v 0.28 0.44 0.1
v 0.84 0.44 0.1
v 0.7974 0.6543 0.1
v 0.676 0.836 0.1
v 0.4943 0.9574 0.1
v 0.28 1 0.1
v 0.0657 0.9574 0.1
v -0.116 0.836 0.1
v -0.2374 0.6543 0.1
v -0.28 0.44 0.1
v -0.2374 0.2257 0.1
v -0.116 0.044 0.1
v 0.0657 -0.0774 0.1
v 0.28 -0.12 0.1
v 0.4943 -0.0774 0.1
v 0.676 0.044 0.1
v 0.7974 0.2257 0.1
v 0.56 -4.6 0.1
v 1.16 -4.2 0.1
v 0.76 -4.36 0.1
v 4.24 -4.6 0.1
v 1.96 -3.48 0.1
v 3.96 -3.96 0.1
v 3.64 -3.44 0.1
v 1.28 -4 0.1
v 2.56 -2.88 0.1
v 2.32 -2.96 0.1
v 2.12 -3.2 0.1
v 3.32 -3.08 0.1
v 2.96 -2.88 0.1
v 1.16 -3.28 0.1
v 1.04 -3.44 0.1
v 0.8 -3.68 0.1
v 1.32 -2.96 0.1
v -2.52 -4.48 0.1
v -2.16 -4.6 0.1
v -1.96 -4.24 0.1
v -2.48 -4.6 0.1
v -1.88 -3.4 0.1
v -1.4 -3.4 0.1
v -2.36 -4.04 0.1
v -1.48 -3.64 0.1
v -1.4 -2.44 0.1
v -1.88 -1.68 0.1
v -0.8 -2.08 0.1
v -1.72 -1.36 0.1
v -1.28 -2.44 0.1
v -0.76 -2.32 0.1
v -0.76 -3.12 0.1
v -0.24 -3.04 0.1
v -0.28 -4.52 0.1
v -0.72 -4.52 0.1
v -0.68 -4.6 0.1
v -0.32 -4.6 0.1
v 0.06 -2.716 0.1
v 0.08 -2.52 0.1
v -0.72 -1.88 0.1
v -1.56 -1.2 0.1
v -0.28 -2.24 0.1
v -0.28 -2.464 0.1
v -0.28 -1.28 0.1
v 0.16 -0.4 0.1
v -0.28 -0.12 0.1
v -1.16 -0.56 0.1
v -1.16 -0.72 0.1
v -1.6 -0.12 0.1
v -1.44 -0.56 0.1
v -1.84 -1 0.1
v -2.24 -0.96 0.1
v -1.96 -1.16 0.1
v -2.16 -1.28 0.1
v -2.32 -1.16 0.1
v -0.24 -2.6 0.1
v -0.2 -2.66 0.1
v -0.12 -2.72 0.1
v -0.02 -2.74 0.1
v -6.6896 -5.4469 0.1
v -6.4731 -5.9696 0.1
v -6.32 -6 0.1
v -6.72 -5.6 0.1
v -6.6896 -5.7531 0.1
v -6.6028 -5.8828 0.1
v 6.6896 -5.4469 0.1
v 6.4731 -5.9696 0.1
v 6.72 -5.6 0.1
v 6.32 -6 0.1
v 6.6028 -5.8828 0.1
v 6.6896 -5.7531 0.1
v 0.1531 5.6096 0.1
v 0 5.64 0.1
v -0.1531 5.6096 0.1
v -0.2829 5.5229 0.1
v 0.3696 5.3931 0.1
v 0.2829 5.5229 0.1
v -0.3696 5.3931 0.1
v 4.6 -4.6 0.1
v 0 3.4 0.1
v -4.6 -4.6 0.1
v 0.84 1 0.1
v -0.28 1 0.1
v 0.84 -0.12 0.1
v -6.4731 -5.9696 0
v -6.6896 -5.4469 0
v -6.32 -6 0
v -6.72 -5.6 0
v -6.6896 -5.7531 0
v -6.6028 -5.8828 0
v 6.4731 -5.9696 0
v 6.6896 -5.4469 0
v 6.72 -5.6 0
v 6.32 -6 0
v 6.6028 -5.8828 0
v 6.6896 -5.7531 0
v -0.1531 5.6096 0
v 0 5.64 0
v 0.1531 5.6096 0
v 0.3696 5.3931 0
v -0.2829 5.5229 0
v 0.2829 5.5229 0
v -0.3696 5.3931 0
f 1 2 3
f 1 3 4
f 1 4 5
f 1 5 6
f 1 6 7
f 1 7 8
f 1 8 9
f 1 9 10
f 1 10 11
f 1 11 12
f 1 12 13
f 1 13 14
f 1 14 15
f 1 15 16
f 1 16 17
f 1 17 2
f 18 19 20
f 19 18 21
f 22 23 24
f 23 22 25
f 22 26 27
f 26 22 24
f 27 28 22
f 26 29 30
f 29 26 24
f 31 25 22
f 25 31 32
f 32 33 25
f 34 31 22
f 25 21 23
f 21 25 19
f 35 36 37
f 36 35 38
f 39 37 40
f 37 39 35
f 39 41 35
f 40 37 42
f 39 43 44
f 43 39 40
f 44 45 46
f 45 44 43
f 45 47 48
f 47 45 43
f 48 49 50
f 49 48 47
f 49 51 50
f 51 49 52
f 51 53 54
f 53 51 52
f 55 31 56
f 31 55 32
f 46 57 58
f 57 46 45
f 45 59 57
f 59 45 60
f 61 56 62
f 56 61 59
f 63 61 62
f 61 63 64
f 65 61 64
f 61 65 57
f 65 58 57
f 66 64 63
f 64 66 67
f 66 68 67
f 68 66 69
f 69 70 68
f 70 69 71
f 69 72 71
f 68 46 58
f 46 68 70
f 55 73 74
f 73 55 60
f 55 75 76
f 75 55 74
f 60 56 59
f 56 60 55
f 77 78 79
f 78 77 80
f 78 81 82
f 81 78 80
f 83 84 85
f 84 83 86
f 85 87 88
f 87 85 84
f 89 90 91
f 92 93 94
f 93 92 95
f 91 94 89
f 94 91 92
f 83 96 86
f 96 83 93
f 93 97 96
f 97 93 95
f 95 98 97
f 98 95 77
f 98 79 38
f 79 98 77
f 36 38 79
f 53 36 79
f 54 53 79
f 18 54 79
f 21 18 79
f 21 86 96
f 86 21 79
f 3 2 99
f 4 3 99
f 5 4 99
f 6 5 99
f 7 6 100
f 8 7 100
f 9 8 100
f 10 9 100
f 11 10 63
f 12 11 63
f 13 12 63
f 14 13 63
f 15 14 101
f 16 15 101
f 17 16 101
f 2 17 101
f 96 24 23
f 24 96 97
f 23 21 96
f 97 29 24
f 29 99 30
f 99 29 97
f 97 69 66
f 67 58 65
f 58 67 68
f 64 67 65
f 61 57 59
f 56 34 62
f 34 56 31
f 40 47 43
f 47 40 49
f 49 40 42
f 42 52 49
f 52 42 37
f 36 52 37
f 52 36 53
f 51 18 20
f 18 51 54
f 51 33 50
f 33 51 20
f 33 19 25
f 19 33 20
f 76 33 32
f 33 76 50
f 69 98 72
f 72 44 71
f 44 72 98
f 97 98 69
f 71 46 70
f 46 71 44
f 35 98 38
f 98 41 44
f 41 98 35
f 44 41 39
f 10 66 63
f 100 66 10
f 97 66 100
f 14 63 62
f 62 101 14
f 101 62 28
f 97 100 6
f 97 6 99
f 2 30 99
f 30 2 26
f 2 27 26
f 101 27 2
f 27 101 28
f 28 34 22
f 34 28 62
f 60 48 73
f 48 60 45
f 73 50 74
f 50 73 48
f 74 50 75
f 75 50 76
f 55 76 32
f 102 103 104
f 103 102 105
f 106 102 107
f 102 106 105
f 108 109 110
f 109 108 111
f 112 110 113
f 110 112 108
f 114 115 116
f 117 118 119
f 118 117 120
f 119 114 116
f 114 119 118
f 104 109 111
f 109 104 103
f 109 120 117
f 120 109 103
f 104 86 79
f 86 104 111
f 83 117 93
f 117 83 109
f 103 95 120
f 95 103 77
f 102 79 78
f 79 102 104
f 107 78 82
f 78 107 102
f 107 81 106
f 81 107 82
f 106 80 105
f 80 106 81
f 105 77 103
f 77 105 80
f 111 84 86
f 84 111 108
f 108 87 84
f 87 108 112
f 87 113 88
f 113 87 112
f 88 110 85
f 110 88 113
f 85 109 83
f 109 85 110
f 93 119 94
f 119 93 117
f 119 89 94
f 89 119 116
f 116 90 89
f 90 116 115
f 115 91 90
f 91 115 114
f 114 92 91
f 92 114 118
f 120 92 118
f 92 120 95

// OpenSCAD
// file: ../p/5-16cyli.scad
use <../lib.scad>
function ldraw_lib__5_16cyli() = [
// 0 Cylinder 0.3125
// 0 Name: 5-16cyli.dat
// 0 Author: Philippe Hurbain [Philo]
// 0 !LDRAW_ORG Primitive UPDATE 2009-03
// 0 !LICENSE Licensed under CC BY 4.0 : see CAreadme.txt
// 
// 0 BFC CERTIFY CCW
  [0,"BFC","CERTIFY"],
  [0,"BFC","CCW"],
// 
// 0 !HISTORY 2009-12-29 [PTadmin] Official Update 2009-03
// 
// 
// 4 16 0.9239 0 0.3827 1 0 0 1 1 0 0.9239 1 0.3827
  [4,16,0.9239,0,0.3827,1,0,0,1,1,0,0.9239,1,0.3827],
// 4 16 0.7071 0 0.7071 0.9239 0 0.3827 0.9239 1 0.3827 0.7071 1 0.7071
  [4,16,0.7071,0,0.7071,0.9239,0,0.3827,0.9239,1,0.3827,0.7071,1,0.7071],
// 4 16 0.3827 0 0.9239 0.7071 0 0.7071 0.7071 1 0.7071 0.3827 1 0.9239
  [4,16,0.3827,0,0.9239,0.7071,0,0.7071,0.7071,1,0.7071,0.3827,1,0.9239],
// 4 16 0 0 1 0.3827 0 0.9239 0.3827 1 0.9239 0 1 1
  [4,16,0,0,1,0.3827,0,0.9239,0.3827,1,0.9239,0,1,1],
// 4 16 -0.3827 0 0.9239 0 0 1 0 1 1 -0.3827 1 0.9239
  [4,16,-0.3827,0,0.9239,0,0,1,0,1,1,-0.3827,1,0.9239],
// 
// 0 // conditional lines
// 5 24 1 1 0 1 0 0 1 1 -0.4142 0.9239 1 0.3827
  [5,24,1,1,0,1,0,0,1,1,-0.4142,0.9239,1,0.3827],
// 5 24 0.9239 1 0.3827 0.9239 0 0.3827 1 1 0 0.7071 1 0.7071
  [5,24,0.9239,1,0.3827,0.9239,0,0.3827,1,1,0,0.7071,1,0.7071],
// 5 24 0.7071 1 0.7071 0.7071 0 0.7071 0.9239 1 0.3827 0.3827 1 0.9239
  [5,24,0.7071,1,0.7071,0.7071,0,0.7071,0.9239,1,0.3827,0.3827,1,0.9239],
// 5 24 0.3827 1 0.9239 0.3827 0 0.9239 0.7071 1 0.7071 0 1 1
  [5,24,0.3827,1,0.9239,0.3827,0,0.9239,0.7071,1,0.7071,0,1,1],
// 5 24 0 1 1 0 0 1 0.3827 1 0.9239 -0.3827 1 0.9239
  [5,24,0,1,1,0,0,1,0.3827,1,0.9239,-0.3827,1,0.9239],
// 5 24 -0.3827 1 0.9239 -0.3827 0 0.9239 0 1 1 -0.7654 1 0.7654
  [5,24,-0.3827,1,0.9239,-0.3827,0,0.9239,0,1,1,-0.7654,1,0.7654],
// 
// 0 // end of file
// 
];
module ldraw_lib__5_16cyli(step=0, col=false, unit=2/5, alt=false, line=0.2, solid=!$preview)
    makepoly(ldraw_lib__5_16cyli(), step=step, col=col, unit=unit, alt=alt, line=line, solid=solid);
ldraw_lib__5_16cyli(line=0.2);
// file: ../p/5-16chrd.scad
use <../lib.scad>
function ldraw_lib__5_16chrd() = [
// 0 Chord 0.3125
// 0 Name: 5-16chrd.dat
// 0 Author: Niels Karsdorp [nielsk]
// 0 !LDRAW_ORG Primitive UPDATE 2010-01
// 0 !LICENSE Licensed under CC BY 4.0 : see CAreadme.txt
// 
// 0 BFC CERTIFY CCW
  [0,"BFC","CERTIFY"],
  [0,"BFC","CCW"],
// 
// 0 !HISTORY 2010-04-05 [PTadmin] Official Update 2010-01
// 
// 
// 4 16 1 0 0 0.9239 0 0.3827 0 0 1 -0.3827 0 0.9239
  [4,16,1,0,0,0.9239,0,0.3827,0,0,1,-0.3827,0,0.9239],
// 4 16 0.9239 0 0.3827 0.7071 0 0.7071 0.3827 0 0.9239 0 0 1
  [4,16,0.9239,0,0.3827,0.7071,0,0.7071,0.3827,0,0.9239,0,0,1],
// 0
// 
];
module ldraw_lib__5_16chrd(step=0, col=false, unit=2/5, alt=false, line=0.2, solid=!$preview)
    makepoly(ldraw_lib__5_16chrd(), step=step, col=col, unit=unit, alt=alt, line=line, solid=solid);
ldraw_lib__5_16chrd(line=0.2);
// file: ../p/4-4ndis.scad
use <../lib.scad>
function ldraw_lib__4_4ndis() = [
// 0 Disc Negative 1.0
// 0 Name: 4-4ndis.dat
// 0 Author: James Jessiman
// 0 !LDRAW_ORG Primitive UPDATE 2012-01
// 0 !LICENSE Licensed under CC BY 4.0 : see CAreadme.txt
// 
// 0 BFC CERTIFY CCW
  [0,"BFC","CERTIFY"],
  [0,"BFC","CCW"],
// 
// 0 !HISTORY 2002-03-23 [sbliss] Added BFC statement; compacted code
// 0 !HISTORY 2002-04-25 [PTadmin] Official Update 2002-02
// 0 !HISTORY 2007-06-24 [PTadmin] Header formatted for Contributor Agreement
// 0 !HISTORY 2008-07-01 [PTadmin] Official Update 2008-01
// 0 !HISTORY 2012-02-16 [Philo] Changed to CCW
// 0 !HISTORY 2012-03-30 [PTadmin] Official Update 2012-01
// 
// 
// 3 16 0.9239 0 0.3827 1 0 0 1 0 1
  [3,16,0.9239,0,0.3827,1,0,0,1,0,1],
// 3 16 0.7071 0 0.7071 0.9239 0 0.3827 1 0 1
  [3,16,0.7071,0,0.7071,0.9239,0,0.3827,1,0,1],
// 3 16 0.3827 0 0.9239 0.7071 0 0.7071 1 0 1
  [3,16,0.3827,0,0.9239,0.7071,0,0.7071,1,0,1],
// 3 16 0 0 1 0.3827 0 0.9239 1 0 1
  [3,16,0,0,1,0.3827,0,0.9239,1,0,1],
// 3 16 -0.3827 0 0.9239 0 0 1 -1 0 1
  [3,16,-0.3827,0,0.9239,0,0,1,-1,0,1],
// 3 16 -0.7071 0 0.7071 -0.3827 0 0.9239 -1 0 1
  [3,16,-0.7071,0,0.7071,-0.3827,0,0.9239,-1,0,1],
// 3 16 -0.9239 0 0.3827 -0.7071 0 0.7071 -1 0 1
  [3,16,-0.9239,0,0.3827,-0.7071,0,0.7071,-1,0,1],
// 3 16 -1 0 0 -0.9239 0 0.3827 -1 0 1
  [3,16,-1,0,0,-0.9239,0,0.3827,-1,0,1],
// 3 16 -0.9239 0 -0.3827 -1 0 0 -1 0 -1
  [3,16,-0.9239,0,-0.3827,-1,0,0,-1,0,-1],
// 3 16 -0.7071 0 -0.7071 -0.9239 0 -0.3827 -1 0 -1
  [3,16,-0.7071,0,-0.7071,-0.9239,0,-0.3827,-1,0,-1],
// 3 16 -0.3827 0 -0.9239 -0.7071 0 -0.7071 -1 0 -1
  [3,16,-0.3827,0,-0.9239,-0.7071,0,-0.7071,-1,0,-1],
// 3 16 0 0 -1 -0.3827 0 -0.9239 -1 0 -1
  [3,16,0,0,-1,-0.3827,0,-0.9239,-1,0,-1],
// 3 16 0.3827 0 -0.9239 0 0 -1 1 0 -1
  [3,16,0.3827,0,-0.9239,0,0,-1,1,0,-1],
// 3 16 0.7071 0 -0.7071 0.3827 0 -0.9239 1 0 -1
  [3,16,0.7071,0,-0.7071,0.3827,0,-0.9239,1,0,-1],
// 3 16 0.9239 0 -0.3827 0.7071 0 -0.7071 1 0 -1
  [3,16,0.9239,0,-0.3827,0.7071,0,-0.7071,1,0,-1],
// 3 16 1 0 0 0.9239 0 -0.3827 1 0 -1
  [3,16,1,0,0,0.9239,0,-0.3827,1,0,-1],
];
module ldraw_lib__4_4ndis(step=0, col=false, unit=2/5, alt=false, line=0.2, solid=!$preview)
    makepoly(ldraw_lib__4_4ndis(), step=step, col=col, unit=unit, alt=alt, line=line, solid=solid);
ldraw_lib__4_4ndis(line=0.2);
// file: ../p/4-4disc.scad
use <../lib.scad>
function ldraw_lib__4_4disc() = [
// 0 Disc 1.0
// 0 Name: 4-4disc.dat
// 0 Author: James Jessiman
// 0 !LDRAW_ORG Primitive UPDATE 2002-02
// 0 !LICENSE Licensed under CC BY 4.0 : see CAreadme.txt
// 
// 0 BFC CERTIFY CCW
  [0,"BFC","CERTIFY"],
  [0,"BFC","CCW"],
// 
// 0 !HISTORY 1998-12-15 [PTadmin] Official Update 1998-10
// 0 !HISTORY 2002-03-23 [sbliss] Added BFC statement
// 0 !HISTORY 2002-04-25 [PTadmin] Official Update 2002-02
// 0 !HISTORY 2007-06-24 [PTadmin] Header formatted for Contributor Agreement
// 0 !HISTORY 2008-07-01 [PTadmin] Official Update 2008-01
// 
// 
// 3 16 0 0 0 1 0 0 0.9239 0 0.3827
  [3,16,0,0,0,1,0,0,0.9239,0,0.3827],
// 3 16 0 0 0 0.9239 0 0.3827 0.7071 0 0.7071
  [3,16,0,0,0,0.9239,0,0.3827,0.7071,0,0.7071],
// 3 16 0 0 0 0.7071 0 0.7071 0.3827 0 0.9239
  [3,16,0,0,0,0.7071,0,0.7071,0.3827,0,0.9239],
// 3 16 0 0 0 0.3827 0 0.9239 0 0 1
  [3,16,0,0,0,0.3827,0,0.9239,0,0,1],
// 3 16 0 0 0 0 0 1 -0.3827 0 0.9239
  [3,16,0,0,0,0,0,1,-0.3827,0,0.9239],
// 3 16 0 0 0 -0.3827 0 0.9239 -0.7071 0 0.7071
  [3,16,0,0,0,-0.3827,0,0.9239,-0.7071,0,0.7071],
// 3 16 0 0 0 -0.7071 0 0.7071 -0.9239 0 0.3827
  [3,16,0,0,0,-0.7071,0,0.7071,-0.9239,0,0.3827],
// 3 16 0 0 0 -0.9239 0 0.3827 -1 0 -0
  [3,16,0,0,0,-0.9239,0,0.3827,-1,0,-0],
// 3 16 0 0 0 -1 0 -0 -0.9239 0 -0.3827
  [3,16,0,0,0,-1,0,-0,-0.9239,0,-0.3827],
// 3 16 0 0 0 -0.9239 0 -0.3827 -0.7071 0 -0.7071
  [3,16,0,0,0,-0.9239,0,-0.3827,-0.7071,0,-0.7071],
// 3 16 0 0 0 -0.7071 0 -0.7071 -0.3827 0 -0.9239
  [3,16,0,0,0,-0.7071,0,-0.7071,-0.3827,0,-0.9239],
// 3 16 0 0 0 -0.3827 0 -0.9239 0 0 -1
  [3,16,0,0,0,-0.3827,0,-0.9239,0,0,-1],
// 3 16 0 0 0 0 0 -1 0.3827 0 -0.9239
  [3,16,0,0,0,0,0,-1,0.3827,0,-0.9239],
// 3 16 0 0 0 0.3827 0 -0.9239 0.7071 0 -0.7071
  [3,16,0,0,0,0.3827,0,-0.9239,0.7071,0,-0.7071],
// 3 16 0 0 0 0.7071 0 -0.7071 0.9239 0 -0.3827
  [3,16,0,0,0,0.7071,0,-0.7071,0.9239,0,-0.3827],
// 3 16 0 0 0 0.9239 0 -0.3827 1 0 0
  [3,16,0,0,0,0.9239,0,-0.3827,1,0,0],
// 0
];
module ldraw_lib__4_4disc(step=0, col=false, unit=2/5, alt=false, line=0.2, solid=!$preview)
    makepoly(ldraw_lib__4_4disc(), step=step, col=col, unit=unit, alt=alt, line=line, solid=solid);
ldraw_lib__4_4disc(line=0.2);
// file: ../p/3-8cyli.scad
use <../lib.scad>
function ldraw_lib__3_8cyli() = [
// 0 Cylinder 0.375
// 0 Name: 3-8cyli.dat
// 0 Author: James Jessiman
// 0 !LDRAW_ORG Primitive UPDATE 2005-01
// 0 !LICENSE Licensed under CC BY 4.0 : see CAreadme.txt
// 
// 0 BFC CERTIFY CCW
  [0,"BFC","CERTIFY"],
  [0,"BFC","CCW"],
// 
// 0 !HISTORY 2002-05-08 [OrionP] Made BFC compliant
// 0 !HISTORY 2002-08-18 [PTadmin] Official Update 2002-04
// 0 !HISTORY 2004-12-11 [nielsk] Recreated using Primitive Generator, Edge lines fixed, BFC changed to CCW
// 0 !HISTORY 2005-12-28 [PTadmin] Official Update 2005-01
// 0 !HISTORY 2007-06-24 [PTadmin] Header formatted for Contributor Agreement
// 0 !HISTORY 2008-07-01 [PTadmin] Official Update 2008-01
// 
// 
// 4 16 .9239 1 .3827 .9239 0 .3827 1 0 0 1 1 0
  [4,16,.9239,1,.3827,.9239,0,.3827,1,0,0,1,1,0],
// 4 16 .7071 1 .7071 .7071 0 .7071 .9239 0 .3827 .9239 1 .3827
  [4,16,.7071,1,.7071,.7071,0,.7071,.9239,0,.3827,.9239,1,.3827],
// 4 16 .3827 1 .9239 .3827 0 .9239 .7071 0 .7071 .7071 1 .7071
  [4,16,.3827,1,.9239,.3827,0,.9239,.7071,0,.7071,.7071,1,.7071],
// 4 16 0 1 1 0 0 1 .3827 0 .9239 .3827 1 .9239
  [4,16,0,1,1,0,0,1,.3827,0,.9239,.3827,1,.9239],
// 4 16 -.3827 1 .9239 -.3827 0 .9239 0 0 1 0 1 1
  [4,16,-.3827,1,.9239,-.3827,0,.9239,0,0,1,0,1,1],
// 4 16 -.7071 1 .7071 -.7071 0 .7071 -.3827 0 .9239 -.3827 1 .9239
  [4,16,-.7071,1,.7071,-.7071,0,.7071,-.3827,0,.9239,-.3827,1,.9239],
// 5 24 1 1 0 1 0 0 1 1 -.4142 .9239 1 .3827
  [5,24,1,1,0,1,0,0,1,1,-.4142,.9239,1,.3827],
// 5 24 .9239 1 .3827 .9239 0 .3827 1 1 0 .7071 1 .7071
  [5,24,.9239,1,.3827,.9239,0,.3827,1,1,0,.7071,1,.7071],
// 5 24 .7071 1 .7071 .7071 0 .7071 .9239 1 .3827 .3827 1 .9239
  [5,24,.7071,1,.7071,.7071,0,.7071,.9239,1,.3827,.3827,1,.9239],
// 5 24 .3827 1 .9239 .3827 0 .9239 .7071 1 .7071 0 1 1
  [5,24,.3827,1,.9239,.3827,0,.9239,.7071,1,.7071,0,1,1],
// 5 24 0 1 1 0 0 1 .3827 1 .9239 -.3827 1 .9239
  [5,24,0,1,1,0,0,1,.3827,1,.9239,-.3827,1,.9239],
// 5 24 -.3827 1 .9239 -.3827 0 .9239 0 1 1 -.7071 1 .7071
  [5,24,-.3827,1,.9239,-.3827,0,.9239,0,1,1,-.7071,1,.7071],
// 5 24 -.7071 1 .7071 -.7071 0 .7071 -.3827 1 .9239 -1 1 .4142
  [5,24,-.7071,1,.7071,-.7071,0,.7071,-.3827,1,.9239,-1,1,.4142],
// 0
];
module ldraw_lib__3_8cyli(step=0, col=false, unit=2/5, alt=false, line=0.2, solid=!$preview)
    makepoly(ldraw_lib__3_8cyli(), step=step, col=col, unit=unit, alt=alt, line=line, solid=solid);
ldraw_lib__3_8cyli(line=0.2);
// file: ../p/3-8chrd.scad
use <../lib.scad>
function ldraw_lib__3_8chrd() = [
// 0 Chord 0.375
// 0 Name: 3-8chrd.dat
// 0 Author: Donald Sutter [technog]
// 0 !LDRAW_ORG Primitive UPDATE 2005-01
// 0 !LICENSE Licensed under CC BY 4.0 : see CAreadme.txt
// 
// 0 BFC CERTIFY CCW
  [0,"BFC","CERTIFY"],
  [0,"BFC","CCW"],
// 
// 0 !HISTORY 2004-01-07 [Steffen] added primitive code for POVray
// 0 !HISTORY 2004-03-18 [mkennedy] removed pov code and rearanged polygons.
// 0 !HISTORY 2004-09-12 [cwdee] reversed winding and standardised precision
// 0 !HISTORY 2005-12-28 [PTadmin] Official Update 2005-01
// 0 !HISTORY 2007-06-24 [PTadmin] Header formatted for Contributor Agreement
// 0 !HISTORY 2008-07-01 [PTadmin] Official Update 2008-01
// 
// 
// 3 16 0.7071 0 0.7071 0.3827 0 0.9239 0 0 1
  [3,16,0.7071,0,0.7071,0.3827,0,0.9239,0,0,1],
// 4 16 0.9239 0 0.3827 -0.3827 0 0.9239 -0.7071 0 0.7071 1 0 0
  [4,16,0.9239,0,0.3827,-0.3827,0,0.9239,-0.7071,0,0.7071,1,0,0],
// 4 16 0.7071 0 0.7071 0 0 1 -0.3827 0 0.9239 0.9239 0 0.3827
  [4,16,0.7071,0,0.7071,0,0,1,-0.3827,0,0.9239,0.9239,0,0.3827],
// 0
];
module ldraw_lib__3_8chrd(step=0, col=false, unit=2/5, alt=false, line=0.2, solid=!$preview)
    makepoly(ldraw_lib__3_8chrd(), step=step, col=col, unit=unit, alt=alt, line=line, solid=solid);
ldraw_lib__3_8chrd(line=0.2);
// main file
use <../lib.scad>
use <../p/3-8chrd.scad>
use <../p/3-8cyli.scad>
use <../p/4-4disc.scad>
use <../p/4-4ndis.scad>
use <../p/5-16chrd.scad>
use <../p/5-16cyli.scad>
function ldraw_lib__4297022f() = [
// 0 Sticker  1.5 x  1.7 Triangular with Worker and  1 Pile
// 0 Name: 4297022f.dat
// 0 Author: Evert-Jan Boer [ejboer]
// 0 !LDRAW_ORG Part UPDATE 2026-02
// 0 !LICENSE Licensed under CC BY 4.0 : see CAreadme.txt
// 
// 0 BFC CERTIFY CCW
  [0,"BFC","CERTIFY"],
  [0,"BFC","CCW"],
// 
// 0 !KEYWORDS Bricklink 7905stk01, Brickowl 660798, Rebrickable 56716, Road Works
// 0 !KEYWORDS Set 7905, Tower Crane
// 
// 0 !HISTORY 2024-06-30 [OrionP] Official Update 2024-05
// 0 !HISTORY 2026-03-03 [MagFors] Update description, reduced decimals
// 0 !HISTORY 2026-03-06 [OrionP] Official Update 2026-02
// 
// 1 0 .7 -.25 1.1 1.4 0 0 0 1 0 0 0 1.4 4-4disc.dat
  [1,0,.7,-.25,1.1,1.4,0,0,0,1,0,0,0,1.4, ldraw_lib__4_4disc()],
// 4 0 1.9 -.25 -10.9 1.4 -.25 -11.5 10.6 -.25 -11.5 2.9 -.25 -10.5
  [4,0,1.9,-.25,-10.9,1.4,-.25,-11.5,10.6,-.25,-11.5,2.9,-.25,-10.5],
// 4 0 4.9 -.25 -8.7 3.2 -.25 -10 9.9 -.25 -9.9 9.1 -.25 -8.6
  [4,0,4.9,-.25,-8.7,3.2,-.25,-10,9.9,-.25,-9.9,9.1,-.25,-8.6],
// 4 0 6.4 -.25 -7.2 5.8 -.25 -7.4 4.9 -.25 -8.7 9.1 -.25 -8.6
  [4,0,6.4,-.25,-7.2,5.8,-.25,-7.4,4.9,-.25,-8.7,9.1,-.25,-8.6],
// 3 0 5.8 -.25 -7.4 5.3 -.25 -8 4.9 -.25 -8.7
  [3,0,5.8,-.25,-7.4,5.3,-.25,-8,4.9,-.25,-8.7],
// 4 0 7.4 -.25 -7.2 6.4 -.25 -7.2 9.1 -.25 -8.6 8.3 -.25 -7.7
  [4,0,7.4,-.25,-7.2,6.4,-.25,-7.2,9.1,-.25,-8.6,8.3,-.25,-7.7],
// 4 0 4.9 -.25 -8.7 2.9 -.25 -8.2 2.6 -.25 -8.6 3.2 -.25 -10
  [4,0,4.9,-.25,-8.7,2.9,-.25,-8.2,2.6,-.25,-8.6,3.2,-.25,-10],
// 3 0 2.6 -.25 -8.6 2 -.25 -9.2 3.2 -.25 -10
  [3,0,2.6,-.25,-8.6,2,-.25,-9.2,3.2,-.25,-10],
// 3 0 3.3 -.25 -7.4 2.9 -.25 -8.2 4.9 -.25 -8.7
  [3,0,3.3,-.25,-7.4,2.9,-.25,-8.2,4.9,-.25,-8.7],
// 4 0 2.9 -.25 -10.5 10.6 -.25 -11.5 9.9 -.25 -9.9 3.2 -.25 -10
  [4,0,2.9,-.25,-10.5,10.6,-.25,-11.5,9.9,-.25,-9.9,3.2,-.25,-10],
// 4 0 -6.3 -.25 -11.2 -6.2 -.25 -11.5 -5.4 -.25 -11.5 -4.9 -.25 -10.6
  [4,0,-6.3,-.25,-11.2,-6.2,-.25,-11.5,-5.4,-.25,-11.5,-4.9,-.25,-10.6],
// 4 0 -3.5 -.25 -8.5 -4.7 -.25 -8.5 -6.3 -.25 -11.2 -4.9 -.25 -10.6
  [4,0,-3.5,-.25,-8.5,-4.7,-.25,-8.5,-6.3,-.25,-11.2,-4.9,-.25,-10.6],
// 3 0 -4.7 -.25 -8.5 -5.9 -.25 -10.1 -6.3 -.25 -11.2
  [3,0,-4.7,-.25,-8.5,-5.9,-.25,-10.1,-6.3,-.25,-11.2],
// 3 0 -3.5 -.25 -8.5 -4.9 -.25 -10.6 -3.7 -.25 -9.1
  [3,0,-3.5,-.25,-8.5,-4.9,-.25,-10.6,-3.7,-.25,-9.1],
// 4 0 -4.7 -.25 -8.5 -3.5 -.25 -8.5 -3.5 -.25 -6.1 -4.7 -.25 -4.2
  [4,0,-4.7,-.25,-8.5,-3.5,-.25,-8.5,-3.5,-.25,-6.1,-4.7,-.25,-4.2],
// 4 0 -3.5 -.25 -6.1 -2 -.25 -5.2 -4.3 -.25 -3.4 -4.7 -.25 -4.2
  [4,0,-3.5,-.25,-6.1,-2,-.25,-5.2,-4.3,-.25,-3.4,-4.7,-.25,-4.2],
// 4 0 -2 -.25 -5.2 -3.5 -.25 -6.1 -3.2 -.25 -6.1 -1.9 -.25 -5.8
  [4,0,-2,-.25,-5.2,-3.5,-.25,-6.1,-3.2,-.25,-6.1,-1.9,-.25,-5.8],
// 4 0 -1.9 -.25 -7.8 -.6 -.25 -7.6 -1.9 -.25 -5.8 -3.2 -.25 -6.1
  [4,0,-1.9,-.25,-7.8,-.6,-.25,-7.6,-1.9,-.25,-5.8,-3.2,-.25,-6.1],
// 4 0 -1.8 -.25 -11.3 -.7 -.25 -11.3 -.6 -.25 -7.6 -1.9 -.25 -7.8
  [4,0,-1.8,-.25,-11.3,-.7,-.25,-11.3,-.6,-.25,-7.6,-1.9,-.25,-7.8],
// 4 0 -1.7 -.25 -11.5 -.8 -.25 -11.5 -.7 -.25 -11.3 -1.8 -.25 -11.3
  [4,0,-1.7,-.25,-11.5,-.8,-.25,-11.5,-.7,-.25,-11.3,-1.8,-.25,-11.3],
// 4 0 2.6 -.25 -8.6 2.9 -.25 -8.2 .2 -.25 -6.3 .15 -.25 -6.79
  [4,0,2.6,-.25,-8.6,2.9,-.25,-8.2,.2,-.25,-6.3,.15,-.25,-6.79],
// 4 0 -1.8 -.25 -4.7 -3.9 -.25 -3 -4.3 -.25 -3.4 -2 -.25 -5.2
  [4,0,-1.8,-.25,-4.7,-3.9,-.25,-3,-4.3,-.25,-3.4,-2,-.25,-5.2],
// 4 0 -.7 -.25 -5.6 -1.8 -.25 -4.7 -2 -.25 -5.2 -.7 -.25 -6.16
  [4,0,-.7,-.25,-5.6,-1.8,-.25,-4.7,-2,-.25,-5.2,-.7,-.25,-6.16],
// 4 0 .4 -.25 -1 -.7 -.25 -3.2 -.7 -.25 -5.6 .2 -.25 -6.3
  [4,0,.4,-.25,-1,-.7,-.25,-3.2,-.7,-.25,-5.6,.2,-.25,-6.3],
// 4 0 -.7 -.25 -3.2 .4 -.25 -1 -.7 -.25 -.3 -2.9 -.25 -1.4
  [4,0,-.7,-.25,-3.2,.4,-.25,-1,-.7,-.25,-.3,-2.9,-.25,-1.4],
// 4 0 -2.9 -.25 -1.8 -1.8 -.25 -4.7 -.7 -.25 -3.2 -2.9 -.25 -1.4
  [4,0,-2.9,-.25,-1.8,-1.8,-.25,-4.7,-.7,-.25,-3.2,-2.9,-.25,-1.4],
// 3 0 -2.9 -.25 -1.8 -3.9 -.25 -3 -1.8 -.25 -4.7
  [3,0,-2.9,-.25,-1.8,-3.9,-.25,-3,-1.8,-.25,-4.7],
// 4 0 -4 -.25 -.3 -3.6 -.25 -1.4 -2.9 -.25 -1.4 -.7 -.25 -.3
  [4,0,-4,-.25,-.3,-3.6,-.25,-1.4,-2.9,-.25,-1.4,-.7,-.25,-.3],
// 4 0 -5.6 -.25 -2.4 -4.6 -.25 -2.5 -3.6 -.25 -1.4 -4 -.25 -.3
  [4,0,-5.6,-.25,-2.4,-4.6,-.25,-2.5,-3.6,-.25,-1.4,-4,-.25,-.3],
// 4 0 -4.9 -.25 -2.9 -4.6 -.25 -2.5 -5.6 -.25 -2.4 -5.4 -.25 -3.2
  [4,0,-4.9,-.25,-2.9,-4.6,-.25,-2.5,-5.6,-.25,-2.4,-5.4,-.25,-3.2],
// 3 0 -5.6 -.25 -2.4 -5.8 -.25 -2.9 -5.4 -.25 -3.2
  [3,0,-5.6,-.25,-2.4,-5.8,-.25,-2.9,-5.4,-.25,-3.2],
// 4 0 -4.3 -.25 -3.4 -3.9 -.25 -3 -4.6 -.25 -2.5 -4.9 -.25 -2.9
  [4,0,-4.3,-.25,-3.4,-3.9,-.25,-3,-4.6,-.25,-2.5,-4.9,-.25,-2.9],
// 4 0 .15 -.25 -6.79 -.7 -.25 -6.16 -.6 -.25 -6.5 -.5 -.25 -6.65
  [4,0,.15,-.25,-6.79,-.7,-.25,-6.16,-.6,-.25,-6.5,-.5,-.25,-6.65],
// 4 0 -.3 -.25 -6.8 -.05 -.25 -6.85 .15 -.25 -6.79 -.5 -.25 -6.65
  [4,0,-.3,-.25,-6.8,-.05,-.25,-6.85,.15,-.25,-6.79,-.5,-.25,-6.65],
// 4 0 .2 -.25 -6.3 -.7 -.25 -5.6 -.7 -.25 -6.16 .15 -.25 -6.79
  [4,0,.2,-.25,-6.3,-.7,-.25,-5.6,-.7,-.25,-6.16,.15,-.25,-6.79],
// 1 4 -15.8 -.25 -14 0 0 -1 0 1 0 -1 0 0 5-16chrd.dat
  [1,4,-15.8,-.25,-14,0,0,-1,0,1,0,-1,0,0, ldraw_lib__5_16chrd()],
// 1 4 15.8 -.25 -14 0 0 1 0 1 0 -1 0 0 5-16chrd.dat
  [1,4,15.8,-.25,-14,0,0,1,0,1,0,-1,0,0, ldraw_lib__5_16chrd()],
// 1 4 0 -.25 13.1 .9239 0 -.3827 0 1 0 .3827 0 .9239 3-8chrd.dat
  [1,4,0,-.25,13.1,.9239,0,-.3827,0,1,0,.3827,0,.9239, ldraw_lib__3_8chrd()],
// 4 4 11.5 -.25 -11.5 15.8 -.25 -15 16.7239 -.25 -13.6173 .9239 -.25 13.4827
  [4,4,11.5,-.25,-11.5,15.8,-.25,-15,16.7239,-.25,-13.6173,.9239,-.25,13.4827],
// 4 4 0 -.25 8.5 11.5 -.25 -11.5 .9239 -.25 13.4827 -.9239 -.25 13.4827
  [4,4,0,-.25,8.5,11.5,-.25,-11.5,.9239,-.25,13.4827,-.9239,-.25,13.4827],
// 4 4 -11.5 -.25 -11.5 0 -.25 8.5 -.9239 -.25 13.4827 -16.7239 -.25 -13.6173
  [4,4,-11.5,-.25,-11.5,0,-.25,8.5,-.9239,-.25,13.4827,-16.7239,-.25,-13.6173],
// 4 4 -16.7239 -.25 -13.6173 -15.8 -.25 -15 -6.2 -.25 -11.5 -11.5 -.25 -11.5
  [4,4,-16.7239,-.25,-13.6173,-15.8,-.25,-15,-6.2,-.25,-11.5,-11.5,-.25,-11.5],
// 3 4 -5.4 -.25 -11.5 -6.2 -.25 -11.5 -15.8 -.25 -15
  [3,4,-5.4,-.25,-11.5,-6.2,-.25,-11.5,-15.8,-.25,-15],
// 3 4 -1.7 -.25 -11.5 -5.4 -.25 -11.5 -15.8 -.25 -15
  [3,4,-1.7,-.25,-11.5,-5.4,-.25,-11.5,-15.8,-.25,-15],
// 3 4 -.8 -.25 -11.5 -1.7 -.25 -11.5 -15.8 -.25 -15
  [3,4,-.8,-.25,-11.5,-1.7,-.25,-11.5,-15.8,-.25,-15],
// 3 4 1.4 -.25 -11.5 -.8 -.25 -11.5 -15.8 -.25 -15
  [3,4,1.4,-.25,-11.5,-.8,-.25,-11.5,-15.8,-.25,-15],
// 3 4 10.6 -.25 -11.5 1.4 -.25 -11.5 -15.8 -.25 -15
  [3,4,10.6,-.25,-11.5,1.4,-.25,-11.5,-15.8,-.25,-15],
// 4 4 11.5 -.25 -11.5 10.6 -.25 -11.5 -15.8 -.25 -15 15.8 -.25 -15
  [4,4,11.5,-.25,-11.5,10.6,-.25,-11.5,-15.8,-.25,-15,15.8,-.25,-15],
// 1 14 .7 -.25 1.1 1.4 0 0 0 1 0 0 0 1.4 4-4ndis.dat
  [1,14,.7,-.25,1.1,1.4,0,0,0,1,0,0,0,1.4, ldraw_lib__4_4ndis()],
// 4 14 9.1 -.25 -8.6 9.9 -.25 -9.9 11.5 -.25 -11.5 0 -.25 8.5
  [4,14,9.1,-.25,-8.6,9.9,-.25,-9.9,11.5,-.25,-11.5,0,-.25,8.5],
// 3 14 9.9 -.25 -9.9 10.6 -.25 -11.5 11.5 -.25 -11.5
  [3,14,9.9,-.25,-9.9,10.6,-.25,-11.5,11.5,-.25,-11.5],
// 3 14 0 -.25 8.5 8.3 -.25 -7.7 9.1 -.25 -8.6
  [3,14,0,-.25,8.5,8.3,-.25,-7.7,9.1,-.25,-8.6],
// 4 14 7.4 -.25 -7.2 8.3 -.25 -7.7 0 -.25 8.5 2.1 -.25 2.5
  [4,14,7.4,-.25,-7.2,8.3,-.25,-7.7,0,-.25,8.5,2.1,-.25,2.5],
// 3 14 0 -.25 8.5 -5.6 -.25 -2.4 -4 -.25 -.3
  [3,14,0,-.25,8.5,-5.6,-.25,-2.4,-4,-.25,-.3],
// 4 14 -3.9 -.25 -3 -2.9 -.25 -1.8 -3.6 -.25 -1.4 -4.6 -.25 -2.5
  [4,14,-3.9,-.25,-3,-2.9,-.25,-1.8,-3.6,-.25,-1.4,-4.6,-.25,-2.5],
// 3 14 -2.9 -.25 -1.4 -3.6 -.25 -1.4 -2.9 -.25 -1.8
  [3,14,-2.9,-.25,-1.4,-3.6,-.25,-1.4,-2.9,-.25,-1.8],
// 3 14 -.7 -.25 -3.2 -1.8 -.25 -4.7 -.7 -.25 -5.6
  [3,14,-.7,-.25,-3.2,-1.8,-.25,-4.7,-.7,-.25,-5.6],
// 4 14 .2 -.25 -6.3 2.9 -.25 -8.2 3.3 -.25 -7.4 .4 -.25 -1
  [4,14,.2,-.25,-6.3,2.9,-.25,-8.2,3.3,-.25,-7.4,.4,-.25,-1],
// 4 14 -3.5 -.25 -8.5 -1.9 -.25 -7.8 -3.2 -.25 -6.1 -3.5 -.25 -6.1
  [4,14,-3.5,-.25,-8.5,-1.9,-.25,-7.8,-3.2,-.25,-6.1,-3.5,-.25,-6.1],
// 3 14 -1.9 -.25 -7.8 -3.5 -.25 -8.5 -3.7 -.25 -9.1
  [3,14,-1.9,-.25,-7.8,-3.5,-.25,-8.5,-3.7,-.25,-9.1],
// 4 14 -1.9 -.25 -7.8 -3.7 -.25 -9.1 -4.9 -.25 -10.6 -1.8 -.25 -11.3
  [4,14,-1.9,-.25,-7.8,-3.7,-.25,-9.1,-4.9,-.25,-10.6,-1.8,-.25,-11.3],
// 4 14 -1.7 -.25 -11.5 -1.8 -.25 -11.3 -4.9 -.25 -10.6 -5.4 -.25 -11.5
  [4,14,-1.7,-.25,-11.5,-1.8,-.25,-11.3,-4.9,-.25,-10.6,-5.4,-.25,-11.5],
// 4 14 -.7 -.25 -11.3 -.8 -.25 -11.5 1.4 -.25 -11.5 1.9 -.25 -10.9
  [4,14,-.7,-.25,-11.3,-.8,-.25,-11.5,1.4,-.25,-11.5,1.9,-.25,-10.9],
// 4 14 2 -.25 -9.2 -.6 -.25 -7.6 -.7 -.25 -11.3 1.9 -.25 -10.9
  [4,14,2,-.25,-9.2,-.6,-.25,-7.6,-.7,-.25,-11.3,1.9,-.25,-10.9],
// 4 14 2.9 -.25 -10.5 3.2 -.25 -10 2 -.25 -9.2 1.9 -.25 -10.9
  [4,14,2.9,-.25,-10.5,3.2,-.25,-10,2,-.25,-9.2,1.9,-.25,-10.9],
// 4 14 -.6 -.25 -7.6 2 -.25 -9.2 2.6 -.25 -8.6 -.05 -.25 -6.85
  [4,14,-.6,-.25,-7.6,2,-.25,-9.2,2.6,-.25,-8.6,-.05,-.25,-6.85],
// 3 14 -5.6 -.25 -2.4 -11.5 -.25 -11.5 -5.8 -.25 -2.9
  [3,14,-5.6,-.25,-2.4,-11.5,-.25,-11.5,-5.8,-.25,-2.9],
// 4 14 -11.5 -.25 -11.5 -4.7 -.25 -4.2 -5.4 -.25 -3.2 -5.8 -.25 -2.9
  [4,14,-11.5,-.25,-11.5,-4.7,-.25,-4.2,-5.4,-.25,-3.2,-5.8,-.25,-2.9],
// 3 14 0 -.25 8.5 -11.5 -.25 -11.5 -5.6 -.25 -2.4
  [3,14,0,-.25,8.5,-11.5,-.25,-11.5,-5.6,-.25,-2.4],
// 4 14 -4.9 -.25 -2.9 -5.4 -.25 -3.2 -4.7 -.25 -4.2 -4.3 -.25 -3.4
  [4,14,-4.9,-.25,-2.9,-5.4,-.25,-3.2,-4.7,-.25,-4.2,-4.3,-.25,-3.4],
// 3 14 -6.3 -.25 -11.2 -11.5 -.25 -11.5 -6.2 -.25 -11.5
  [3,14,-6.3,-.25,-11.2,-11.5,-.25,-11.5,-6.2,-.25,-11.5],
// 4 14 -6.3 -.25 -11.2 -5.9 -.25 -10.1 -4.7 -.25 -4.2 -11.5 -.25 -11.5
  [4,14,-6.3,-.25,-11.2,-5.9,-.25,-10.1,-4.7,-.25,-4.2,-11.5,-.25,-11.5],
// 3 14 -4.7 -.25 -4.2 -5.9 -.25 -10.1 -4.7 -.25 -8.5
  [3,14,-4.7,-.25,-4.2,-5.9,-.25,-10.1,-4.7,-.25,-8.5],
// 3 14 -.7 -.25 1.1 -4 -.25 -.3 -.7 -.25 -.3
  [3,14,-.7,-.25,1.1,-4,-.25,-.3,-.7,-.25,-.3],
// 3 14 -.7 -.25 2.5 -4 -.25 -.3 -.7 -.25 1.1
  [3,14,-.7,-.25,2.5,-4,-.25,-.3,-.7,-.25,1.1],
// 3 14 0 -.25 8.5 -4 -.25 -.3 -.7 -.25 2.5
  [3,14,0,-.25,8.5,-4,-.25,-.3,-.7,-.25,2.5],
// 3 14 .7 -.25 -.3 -.7 -.25 -.3 .4 -.25 -1
  [3,14,.7,-.25,-.3,-.7,-.25,-.3,.4,-.25,-1],
// 4 14 5.3 -.25 -8 2.1 -.25 -.3 .7 -.25 -.3 .4 -.25 -1
  [4,14,5.3,-.25,-8,2.1,-.25,-.3,.7,-.25,-.3,.4,-.25,-1],
// 3 14 0 -.25 8.5 -.7 -.25 2.5 .7 -.25 2.5
  [3,14,0,-.25,8.5,-.7,-.25,2.5,.7,-.25,2.5],
// 3 14 0 -.25 8.5 .7 -.25 2.5 2.1 -.25 2.5
  [3,14,0,-.25,8.5,.7,-.25,2.5,2.1,-.25,2.5],
// 4 14 6.4 -.25 -7.2 7.4 -.25 -7.2 2.1 -.25 2.5 2.1 -.25 1.1
  [4,14,6.4,-.25,-7.2,7.4,-.25,-7.2,2.1,-.25,2.5,2.1,-.25,1.1],
// 3 14 2.1 -.25 1.1 5.8 -.25 -7.4 6.4 -.25 -7.2
  [3,14,2.1,-.25,1.1,5.8,-.25,-7.4,6.4,-.25,-7.2],
// 4 14 5.3 -.25 -8 5.8 -.25 -7.4 2.1 -.25 1.1 2.1 -.25 -.3
  [4,14,5.3,-.25,-8,5.8,-.25,-7.4,2.1,-.25,1.1,2.1,-.25,-.3],
// 4 14 4.9 -.25 -8.7 5.3 -.25 -8 .4 -.25 -1 3.3 -.25 -7.4
  [4,14,4.9,-.25,-8.7,5.3,-.25,-8,.4,-.25,-1,3.3,-.25,-7.4],
// 4 14 -.7 -.25 -6.16 -2 -.25 -5.2 -1.9 -.25 -5.8 -.6 -.25 -6.5
  [4,14,-.7,-.25,-6.16,-2,-.25,-5.2,-1.9,-.25,-5.8,-.6,-.25,-6.5],
// 4 14 -.6 -.25 -6.5 -1.9 -.25 -5.8 -.6 -.25 -7.6 -.5 -.25 -6.65
  [4,14,-.6,-.25,-6.5,-1.9,-.25,-5.8,-.6,-.25,-7.6,-.5,-.25,-6.65],
// 3 14 -.5 -.25 -6.65 -.6 -.25 -7.6 -.3 -.25 -6.8
  [3,14,-.5,-.25,-6.65,-.6,-.25,-7.6,-.3,-.25,-6.8],
// 3 14 -.3 -.25 -6.8 -.6 -.25 -7.6 -.05 -.25 -6.85
  [3,14,-.3,-.25,-6.8,-.6,-.25,-7.6,-.05,-.25,-6.85],
// 3 14 .15 -.25 -6.79 -.05 -.25 -6.85 2.6 -.25 -8.6
  [3,14,.15,-.25,-6.79,-.05,-.25,-6.85,2.6,-.25,-8.6],
// 
// 1 16 -15.8 0 -14 0 0 -1 0 -1 0 -1 0 0 5-16chrd.dat
  [1,16,-15.8,0,-14,0,0,-1,0,-1,0,-1,0,0, ldraw_lib__5_16chrd()],
// 1 16 15.8 0 -14 0 0 1 0 -1 0 -1 0 0 5-16chrd.dat
  [1,16,15.8,0,-14,0,0,1,0,-1,0,-1,0,0, ldraw_lib__5_16chrd()],
// 1 16 0 0 13.1 .9239 0 -.3827 0 -1 0 .3827 0 .9239 3-8chrd.dat
  [1,16,0,0,13.1,.9239,0,-.3827,0,-1,0,.3827,0,.9239, ldraw_lib__3_8chrd()],
// 4 16 16.7239 0 -13.6173 15.8 0 -15 -15.8 0 -15 -16.7239 0 -13.6173
  [4,16,16.7239,0,-13.6173,15.8,0,-15,-15.8,0,-15,-16.7239,0,-13.6173],
// 4 16 .9239 0 13.4827 16.7239 0 -13.6173 -16.7239 0 -13.6173 -.9239 0 13.4827
  [4,16,.9239,0,13.4827,16.7239,0,-13.6173,-16.7239,0,-13.6173,-.9239,0,13.4827],
// 
// 4 16 15.8 -.25 -15 -15.8 -.25 -15 -15.8 0 -15 15.8 0 -15
  [4,16,15.8,-.25,-15,-15.8,-.25,-15,-15.8,0,-15,15.8,0,-15],
// 4 16 .9239 -.25 13.4827 16.7239 -.25 -13.6173 16.7239 0 -13.6173 .9239 0 13.4827
  [4,16,.9239,-.25,13.4827,16.7239,-.25,-13.6173,16.7239,0,-13.6173,.9239,0,13.4827],
// 4 16 -16.7239 -.25 -13.6173 -.9239 -.25 13.4827 -.9239 0 13.4827 -16.7239 0 -13.6173
  [4,16,-16.7239,-.25,-13.6173,-.9239,-.25,13.4827,-.9239,0,13.4827,-16.7239,0,-13.6173],
// 1 16 -15.8 -.25 -14 0 0 -1 0 .25 0 -1 0 0 5-16cyli.dat
  [1,16,-15.8,-.25,-14,0,0,-1,0,.25,0,-1,0,0, ldraw_lib__5_16cyli()],
// 1 16 15.8 -.25 -14 0 0 1 0 .25 0 -1 0 0 5-16cyli.dat
  [1,16,15.8,-.25,-14,0,0,1,0,.25,0,-1,0,0, ldraw_lib__5_16cyli()],
// 1 16 0 -.25 13.1 .9239 0 -.3827 0 .25 0 .3827 0 .9239 3-8cyli.dat
  [1,16,0,-.25,13.1,.9239,0,-.3827,0,.25,0,.3827,0,.9239, ldraw_lib__3_8cyli()],
// 
// 5 24 16.7239 -.25 -13.6173 16.7239 0 -13.6173 .9239 -.25 13.4827 16.8 -.25 -14
  [5,24,16.7239,-.25,-13.6173,16.7239,0,-13.6173,.9239,-.25,13.4827,16.8,-.25,-14],
// 5 24 -16.7239 0 -13.6173 -16.7239 -.25 -13.6173 -.9239 -.25 13.4827 -16.8 0 -14
  [5,24,-16.7239,0,-13.6173,-16.7239,-.25,-13.6173,-.9239,-.25,13.4827,-16.8,0,-14],
// 5 24 .9239 -.25 13.4827 .9239 0 13.4827 .7071 0 13.8071 16.7239 -.25 -13.6173
  [5,24,.9239,-.25,13.4827,.9239,0,13.4827,.7071,0,13.8071,16.7239,-.25,-13.6173],
// 5 24 15.8 0 -15 15.8 -.25 -15 -15.8 -.25 -15 16.1827 0 -14.9239
  [5,24,15.8,0,-15,15.8,-.25,-15,-15.8,-.25,-15,16.1827,0,-14.9239],
// 5 24 -15.8 -.25 -15 -15.8 0 -15 15.8 0 -15 -16.1827 -.25 -14.9239
  [5,24,-15.8,-.25,-15,-15.8,0,-15,15.8,0,-15,-16.1827,-.25,-14.9239],
// 5 24 -.9239 0 13.4827 -.9239 -.25 13.4827 -16.7239 0 -13.6173 -.7071 -.25 13.8071
  [5,24,-.9239,0,13.4827,-.9239,-.25,13.4827,-16.7239,0,-13.6173,-.7071,-.25,13.8071],
];
module ldraw_lib__4297022f(step=0, col=false, unit=2/5, alt=false, line=0.2, solid=!$preview)
    makepoly(ldraw_lib__4297022f(), step=step, col=col, unit=unit, alt=alt, line=line, solid=solid);
ldraw_lib__4297022f(line=0.2);
